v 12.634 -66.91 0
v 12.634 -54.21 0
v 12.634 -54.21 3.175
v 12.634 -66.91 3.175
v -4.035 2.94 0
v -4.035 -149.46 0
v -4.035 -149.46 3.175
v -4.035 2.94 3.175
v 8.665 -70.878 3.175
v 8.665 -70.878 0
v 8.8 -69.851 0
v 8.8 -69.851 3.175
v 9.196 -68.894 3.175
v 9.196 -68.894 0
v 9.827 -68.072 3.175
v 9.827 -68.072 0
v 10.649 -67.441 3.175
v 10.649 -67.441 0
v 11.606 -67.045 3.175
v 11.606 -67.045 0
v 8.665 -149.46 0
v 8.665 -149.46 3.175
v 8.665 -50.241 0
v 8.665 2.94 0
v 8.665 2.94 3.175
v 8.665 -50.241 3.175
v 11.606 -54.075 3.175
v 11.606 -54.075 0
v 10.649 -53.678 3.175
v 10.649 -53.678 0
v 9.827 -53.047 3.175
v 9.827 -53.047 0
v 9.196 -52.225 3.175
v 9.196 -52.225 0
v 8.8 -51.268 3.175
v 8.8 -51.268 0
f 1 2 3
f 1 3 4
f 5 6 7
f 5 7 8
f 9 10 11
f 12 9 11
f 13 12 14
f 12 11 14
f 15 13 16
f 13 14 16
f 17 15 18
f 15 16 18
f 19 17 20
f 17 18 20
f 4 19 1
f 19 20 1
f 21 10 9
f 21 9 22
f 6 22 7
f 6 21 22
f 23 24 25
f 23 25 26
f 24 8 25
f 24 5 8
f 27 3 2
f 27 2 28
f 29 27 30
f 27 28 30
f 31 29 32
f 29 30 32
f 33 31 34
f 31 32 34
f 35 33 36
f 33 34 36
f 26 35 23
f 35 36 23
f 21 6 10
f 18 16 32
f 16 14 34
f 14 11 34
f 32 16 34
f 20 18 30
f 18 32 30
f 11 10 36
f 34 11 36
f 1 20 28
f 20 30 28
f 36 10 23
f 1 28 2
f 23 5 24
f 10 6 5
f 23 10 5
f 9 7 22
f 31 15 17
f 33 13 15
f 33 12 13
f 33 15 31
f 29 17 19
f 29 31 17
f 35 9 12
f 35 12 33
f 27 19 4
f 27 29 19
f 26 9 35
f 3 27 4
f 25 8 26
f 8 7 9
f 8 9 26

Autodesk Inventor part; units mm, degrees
ref_plane "YZ Plane" through (0, 0, 0) normal (1, 0, 0) x (0, 1, 0)
ref_plane "XZ Plane" through (0, 0, 0) normal (0, 1, 0) x (-1, 0, 0)
ref_plane "XY Plane" through (0, 0, 0) normal (0, 0, 1) x (1, 0, 0)
sketch "Sketch1" plane through (0, 0, 0) normal (0, 0, 1) x (1, 0, 0)
  line L0 (-4.0353, 2.9403) -> (8.6647, 2.9403)
  line L1 (8.6647, 2.9403) -> (8.6647, -50.241)
  line L2 (8.6647, -149.4597) -> (-4.0353, -149.4597)
  line L3 (-4.0353, -149.4597) -> (-4.0353, 2.9403)
  line L4 (12.6335, -54.2097) -> (12.6335, -54.2097)
  line L5 (12.6335, -54.2097) -> (12.6335, -66.9097)
  line L6 (12.6335, -66.9097) -> (12.6335, -66.9097)
  line L7 (8.6647, -70.8785) -> (8.6647, -149.4597)
  arc A0 (8.6647, -50.241) -> (12.6335, -54.2097) centre (12.6335, -50.241) ccw
  arc A1 (12.6335, -66.9097) -> (8.6647, -70.8785) centre (12.6335, -70.8785) ccw
  point P0 (0, 0)
  point P1 (8.6647, -66.9097)
  dimension "d0" = 12.7
  dimension "d1" = 152.4
  dimension "d2" = 3.9688
  dimension "d3" = 12.7
  dimension "d4" = 3.9688
  dimension "d5" = 57.15
extrude "Extrusion1" add sketch "Sketch1" along normal blind 3.175
properties part number "Granny Gearbox Routing Template Vertical Tabs"
